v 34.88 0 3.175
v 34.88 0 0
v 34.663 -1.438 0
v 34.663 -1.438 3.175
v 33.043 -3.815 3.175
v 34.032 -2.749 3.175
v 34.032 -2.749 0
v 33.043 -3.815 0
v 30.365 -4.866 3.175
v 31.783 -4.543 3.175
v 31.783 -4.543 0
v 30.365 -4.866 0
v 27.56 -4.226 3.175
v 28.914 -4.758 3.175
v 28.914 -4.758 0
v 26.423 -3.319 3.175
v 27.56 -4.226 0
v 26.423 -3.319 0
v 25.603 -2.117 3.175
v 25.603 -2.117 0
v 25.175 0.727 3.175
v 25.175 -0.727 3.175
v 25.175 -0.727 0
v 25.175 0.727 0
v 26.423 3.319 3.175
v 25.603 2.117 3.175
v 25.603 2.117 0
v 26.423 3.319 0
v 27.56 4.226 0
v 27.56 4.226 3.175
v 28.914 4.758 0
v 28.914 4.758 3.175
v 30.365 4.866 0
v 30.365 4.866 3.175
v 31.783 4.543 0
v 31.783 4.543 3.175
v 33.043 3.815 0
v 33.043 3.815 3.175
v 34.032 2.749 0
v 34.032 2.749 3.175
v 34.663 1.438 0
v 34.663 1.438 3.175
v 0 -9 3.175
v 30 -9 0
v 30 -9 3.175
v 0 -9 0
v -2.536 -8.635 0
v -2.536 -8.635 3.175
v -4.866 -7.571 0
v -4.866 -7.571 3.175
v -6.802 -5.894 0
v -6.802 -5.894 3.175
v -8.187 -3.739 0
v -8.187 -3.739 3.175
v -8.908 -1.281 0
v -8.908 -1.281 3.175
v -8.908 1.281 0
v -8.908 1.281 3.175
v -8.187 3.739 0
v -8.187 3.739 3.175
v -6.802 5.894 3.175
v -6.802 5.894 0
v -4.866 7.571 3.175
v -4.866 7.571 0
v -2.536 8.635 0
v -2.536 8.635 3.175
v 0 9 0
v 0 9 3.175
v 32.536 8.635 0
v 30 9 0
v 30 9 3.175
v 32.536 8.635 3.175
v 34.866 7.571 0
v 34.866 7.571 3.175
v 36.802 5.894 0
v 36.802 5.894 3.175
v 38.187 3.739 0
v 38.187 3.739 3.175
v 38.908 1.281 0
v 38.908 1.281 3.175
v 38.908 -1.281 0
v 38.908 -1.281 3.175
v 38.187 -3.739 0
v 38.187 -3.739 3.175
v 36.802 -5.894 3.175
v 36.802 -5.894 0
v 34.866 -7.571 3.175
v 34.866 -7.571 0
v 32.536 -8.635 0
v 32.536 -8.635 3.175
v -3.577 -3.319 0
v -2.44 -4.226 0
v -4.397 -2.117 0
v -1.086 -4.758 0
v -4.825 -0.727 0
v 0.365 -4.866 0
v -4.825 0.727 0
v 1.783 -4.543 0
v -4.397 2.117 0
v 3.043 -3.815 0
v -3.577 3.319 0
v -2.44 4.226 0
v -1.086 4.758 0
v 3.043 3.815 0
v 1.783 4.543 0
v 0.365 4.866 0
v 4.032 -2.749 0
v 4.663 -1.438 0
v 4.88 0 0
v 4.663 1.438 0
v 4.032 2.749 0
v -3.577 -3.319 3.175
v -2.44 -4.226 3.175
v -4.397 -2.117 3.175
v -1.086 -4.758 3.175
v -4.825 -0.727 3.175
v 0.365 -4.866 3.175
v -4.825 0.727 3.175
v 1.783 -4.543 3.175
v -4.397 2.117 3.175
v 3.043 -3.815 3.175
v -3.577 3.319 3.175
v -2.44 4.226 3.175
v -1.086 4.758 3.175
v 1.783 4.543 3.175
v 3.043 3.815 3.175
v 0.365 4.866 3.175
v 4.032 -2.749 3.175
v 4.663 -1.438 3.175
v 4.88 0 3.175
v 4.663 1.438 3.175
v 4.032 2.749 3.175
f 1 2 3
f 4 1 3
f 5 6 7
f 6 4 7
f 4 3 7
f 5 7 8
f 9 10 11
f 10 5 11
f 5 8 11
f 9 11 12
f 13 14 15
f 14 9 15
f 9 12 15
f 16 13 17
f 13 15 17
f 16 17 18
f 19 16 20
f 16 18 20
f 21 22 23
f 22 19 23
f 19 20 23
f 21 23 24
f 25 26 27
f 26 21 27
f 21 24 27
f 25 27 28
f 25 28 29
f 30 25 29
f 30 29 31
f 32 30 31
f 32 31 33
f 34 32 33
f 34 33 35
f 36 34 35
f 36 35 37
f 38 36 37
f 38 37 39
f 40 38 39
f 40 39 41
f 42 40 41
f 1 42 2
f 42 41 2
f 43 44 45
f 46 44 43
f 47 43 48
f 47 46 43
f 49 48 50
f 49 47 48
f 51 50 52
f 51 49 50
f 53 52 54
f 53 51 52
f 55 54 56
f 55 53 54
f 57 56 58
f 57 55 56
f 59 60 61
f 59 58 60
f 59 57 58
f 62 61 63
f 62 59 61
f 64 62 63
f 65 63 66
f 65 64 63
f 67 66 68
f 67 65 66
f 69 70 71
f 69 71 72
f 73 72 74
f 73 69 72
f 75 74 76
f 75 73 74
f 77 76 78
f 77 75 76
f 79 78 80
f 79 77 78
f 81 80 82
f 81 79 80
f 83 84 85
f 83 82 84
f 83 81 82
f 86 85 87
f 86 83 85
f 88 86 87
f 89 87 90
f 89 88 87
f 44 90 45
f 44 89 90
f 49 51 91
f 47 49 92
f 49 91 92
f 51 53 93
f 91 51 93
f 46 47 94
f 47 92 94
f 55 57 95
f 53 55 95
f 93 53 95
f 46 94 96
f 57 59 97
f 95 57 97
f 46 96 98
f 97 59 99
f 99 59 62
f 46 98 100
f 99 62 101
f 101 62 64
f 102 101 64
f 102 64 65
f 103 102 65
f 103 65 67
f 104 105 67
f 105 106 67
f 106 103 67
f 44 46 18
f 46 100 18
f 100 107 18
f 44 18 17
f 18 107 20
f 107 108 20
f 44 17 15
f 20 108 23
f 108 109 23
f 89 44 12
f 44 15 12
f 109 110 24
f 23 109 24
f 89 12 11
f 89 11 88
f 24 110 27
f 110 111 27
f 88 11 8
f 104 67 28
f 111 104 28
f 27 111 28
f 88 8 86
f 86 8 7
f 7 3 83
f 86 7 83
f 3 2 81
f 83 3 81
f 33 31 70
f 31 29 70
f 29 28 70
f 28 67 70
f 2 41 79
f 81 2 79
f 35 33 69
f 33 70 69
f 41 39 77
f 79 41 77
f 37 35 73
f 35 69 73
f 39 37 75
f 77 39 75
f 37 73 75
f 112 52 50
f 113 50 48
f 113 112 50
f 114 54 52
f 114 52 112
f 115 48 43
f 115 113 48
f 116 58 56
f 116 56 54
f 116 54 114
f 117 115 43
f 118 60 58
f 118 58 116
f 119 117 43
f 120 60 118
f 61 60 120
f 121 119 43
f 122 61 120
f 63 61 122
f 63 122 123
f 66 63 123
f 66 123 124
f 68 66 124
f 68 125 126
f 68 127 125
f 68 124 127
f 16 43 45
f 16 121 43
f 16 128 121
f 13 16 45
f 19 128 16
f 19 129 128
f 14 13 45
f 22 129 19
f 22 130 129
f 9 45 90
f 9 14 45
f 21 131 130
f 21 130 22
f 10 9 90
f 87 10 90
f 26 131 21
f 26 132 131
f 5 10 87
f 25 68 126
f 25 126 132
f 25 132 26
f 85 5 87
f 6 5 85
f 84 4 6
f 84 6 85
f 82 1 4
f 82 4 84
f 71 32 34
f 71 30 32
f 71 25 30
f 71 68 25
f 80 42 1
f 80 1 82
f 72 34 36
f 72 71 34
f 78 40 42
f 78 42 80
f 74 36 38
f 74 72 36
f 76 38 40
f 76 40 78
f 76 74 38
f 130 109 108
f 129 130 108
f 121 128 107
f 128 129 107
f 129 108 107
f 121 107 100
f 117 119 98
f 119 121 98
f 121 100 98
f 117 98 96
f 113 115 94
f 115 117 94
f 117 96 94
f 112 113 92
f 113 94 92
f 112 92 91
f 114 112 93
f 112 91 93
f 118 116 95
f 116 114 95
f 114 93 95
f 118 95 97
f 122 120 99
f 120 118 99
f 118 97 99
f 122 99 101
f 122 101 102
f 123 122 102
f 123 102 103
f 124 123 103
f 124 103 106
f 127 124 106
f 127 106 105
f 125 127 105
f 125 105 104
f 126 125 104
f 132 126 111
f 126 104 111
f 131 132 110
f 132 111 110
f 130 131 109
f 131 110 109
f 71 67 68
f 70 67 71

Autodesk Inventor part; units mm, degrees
ref_plane "YZ Plane" through (0, 0, 0) normal (1, 0, 0) x (0, 1, 0)
ref_plane "XZ Plane" through (0, 0, 0) normal (0, 1, 0) x (-1, 0, 0)
ref_plane "XY Plane" through (0, 0, 0) normal (0, 0, 1) x (1, 0, 0)
sketch "Sketch1" plane through (0, 0, 0) normal (0, 0, 1) x (1, 0, 0)
  circle A0 centre (0, 0) radius 4.88
  line L0 (0, 9) -> (30, 9)
  arc A1 (30, -9) -> (30, 9) centre (30, 0) ccw
  line L1 (30, -9) -> (0, -9)
  arc A2 (0, 9) -> (0, -9) centre (0, 0) ccw
  circle A3 centre (30, 0) radius 4.88
  dimension "d0" = 9.76
  dimension "d1" = 9
  dimension "d2" = 30
extrude "Extrusion1" add sketch "Sketch1" along normal blind 3.175
properties part number "tipper_link_D"
